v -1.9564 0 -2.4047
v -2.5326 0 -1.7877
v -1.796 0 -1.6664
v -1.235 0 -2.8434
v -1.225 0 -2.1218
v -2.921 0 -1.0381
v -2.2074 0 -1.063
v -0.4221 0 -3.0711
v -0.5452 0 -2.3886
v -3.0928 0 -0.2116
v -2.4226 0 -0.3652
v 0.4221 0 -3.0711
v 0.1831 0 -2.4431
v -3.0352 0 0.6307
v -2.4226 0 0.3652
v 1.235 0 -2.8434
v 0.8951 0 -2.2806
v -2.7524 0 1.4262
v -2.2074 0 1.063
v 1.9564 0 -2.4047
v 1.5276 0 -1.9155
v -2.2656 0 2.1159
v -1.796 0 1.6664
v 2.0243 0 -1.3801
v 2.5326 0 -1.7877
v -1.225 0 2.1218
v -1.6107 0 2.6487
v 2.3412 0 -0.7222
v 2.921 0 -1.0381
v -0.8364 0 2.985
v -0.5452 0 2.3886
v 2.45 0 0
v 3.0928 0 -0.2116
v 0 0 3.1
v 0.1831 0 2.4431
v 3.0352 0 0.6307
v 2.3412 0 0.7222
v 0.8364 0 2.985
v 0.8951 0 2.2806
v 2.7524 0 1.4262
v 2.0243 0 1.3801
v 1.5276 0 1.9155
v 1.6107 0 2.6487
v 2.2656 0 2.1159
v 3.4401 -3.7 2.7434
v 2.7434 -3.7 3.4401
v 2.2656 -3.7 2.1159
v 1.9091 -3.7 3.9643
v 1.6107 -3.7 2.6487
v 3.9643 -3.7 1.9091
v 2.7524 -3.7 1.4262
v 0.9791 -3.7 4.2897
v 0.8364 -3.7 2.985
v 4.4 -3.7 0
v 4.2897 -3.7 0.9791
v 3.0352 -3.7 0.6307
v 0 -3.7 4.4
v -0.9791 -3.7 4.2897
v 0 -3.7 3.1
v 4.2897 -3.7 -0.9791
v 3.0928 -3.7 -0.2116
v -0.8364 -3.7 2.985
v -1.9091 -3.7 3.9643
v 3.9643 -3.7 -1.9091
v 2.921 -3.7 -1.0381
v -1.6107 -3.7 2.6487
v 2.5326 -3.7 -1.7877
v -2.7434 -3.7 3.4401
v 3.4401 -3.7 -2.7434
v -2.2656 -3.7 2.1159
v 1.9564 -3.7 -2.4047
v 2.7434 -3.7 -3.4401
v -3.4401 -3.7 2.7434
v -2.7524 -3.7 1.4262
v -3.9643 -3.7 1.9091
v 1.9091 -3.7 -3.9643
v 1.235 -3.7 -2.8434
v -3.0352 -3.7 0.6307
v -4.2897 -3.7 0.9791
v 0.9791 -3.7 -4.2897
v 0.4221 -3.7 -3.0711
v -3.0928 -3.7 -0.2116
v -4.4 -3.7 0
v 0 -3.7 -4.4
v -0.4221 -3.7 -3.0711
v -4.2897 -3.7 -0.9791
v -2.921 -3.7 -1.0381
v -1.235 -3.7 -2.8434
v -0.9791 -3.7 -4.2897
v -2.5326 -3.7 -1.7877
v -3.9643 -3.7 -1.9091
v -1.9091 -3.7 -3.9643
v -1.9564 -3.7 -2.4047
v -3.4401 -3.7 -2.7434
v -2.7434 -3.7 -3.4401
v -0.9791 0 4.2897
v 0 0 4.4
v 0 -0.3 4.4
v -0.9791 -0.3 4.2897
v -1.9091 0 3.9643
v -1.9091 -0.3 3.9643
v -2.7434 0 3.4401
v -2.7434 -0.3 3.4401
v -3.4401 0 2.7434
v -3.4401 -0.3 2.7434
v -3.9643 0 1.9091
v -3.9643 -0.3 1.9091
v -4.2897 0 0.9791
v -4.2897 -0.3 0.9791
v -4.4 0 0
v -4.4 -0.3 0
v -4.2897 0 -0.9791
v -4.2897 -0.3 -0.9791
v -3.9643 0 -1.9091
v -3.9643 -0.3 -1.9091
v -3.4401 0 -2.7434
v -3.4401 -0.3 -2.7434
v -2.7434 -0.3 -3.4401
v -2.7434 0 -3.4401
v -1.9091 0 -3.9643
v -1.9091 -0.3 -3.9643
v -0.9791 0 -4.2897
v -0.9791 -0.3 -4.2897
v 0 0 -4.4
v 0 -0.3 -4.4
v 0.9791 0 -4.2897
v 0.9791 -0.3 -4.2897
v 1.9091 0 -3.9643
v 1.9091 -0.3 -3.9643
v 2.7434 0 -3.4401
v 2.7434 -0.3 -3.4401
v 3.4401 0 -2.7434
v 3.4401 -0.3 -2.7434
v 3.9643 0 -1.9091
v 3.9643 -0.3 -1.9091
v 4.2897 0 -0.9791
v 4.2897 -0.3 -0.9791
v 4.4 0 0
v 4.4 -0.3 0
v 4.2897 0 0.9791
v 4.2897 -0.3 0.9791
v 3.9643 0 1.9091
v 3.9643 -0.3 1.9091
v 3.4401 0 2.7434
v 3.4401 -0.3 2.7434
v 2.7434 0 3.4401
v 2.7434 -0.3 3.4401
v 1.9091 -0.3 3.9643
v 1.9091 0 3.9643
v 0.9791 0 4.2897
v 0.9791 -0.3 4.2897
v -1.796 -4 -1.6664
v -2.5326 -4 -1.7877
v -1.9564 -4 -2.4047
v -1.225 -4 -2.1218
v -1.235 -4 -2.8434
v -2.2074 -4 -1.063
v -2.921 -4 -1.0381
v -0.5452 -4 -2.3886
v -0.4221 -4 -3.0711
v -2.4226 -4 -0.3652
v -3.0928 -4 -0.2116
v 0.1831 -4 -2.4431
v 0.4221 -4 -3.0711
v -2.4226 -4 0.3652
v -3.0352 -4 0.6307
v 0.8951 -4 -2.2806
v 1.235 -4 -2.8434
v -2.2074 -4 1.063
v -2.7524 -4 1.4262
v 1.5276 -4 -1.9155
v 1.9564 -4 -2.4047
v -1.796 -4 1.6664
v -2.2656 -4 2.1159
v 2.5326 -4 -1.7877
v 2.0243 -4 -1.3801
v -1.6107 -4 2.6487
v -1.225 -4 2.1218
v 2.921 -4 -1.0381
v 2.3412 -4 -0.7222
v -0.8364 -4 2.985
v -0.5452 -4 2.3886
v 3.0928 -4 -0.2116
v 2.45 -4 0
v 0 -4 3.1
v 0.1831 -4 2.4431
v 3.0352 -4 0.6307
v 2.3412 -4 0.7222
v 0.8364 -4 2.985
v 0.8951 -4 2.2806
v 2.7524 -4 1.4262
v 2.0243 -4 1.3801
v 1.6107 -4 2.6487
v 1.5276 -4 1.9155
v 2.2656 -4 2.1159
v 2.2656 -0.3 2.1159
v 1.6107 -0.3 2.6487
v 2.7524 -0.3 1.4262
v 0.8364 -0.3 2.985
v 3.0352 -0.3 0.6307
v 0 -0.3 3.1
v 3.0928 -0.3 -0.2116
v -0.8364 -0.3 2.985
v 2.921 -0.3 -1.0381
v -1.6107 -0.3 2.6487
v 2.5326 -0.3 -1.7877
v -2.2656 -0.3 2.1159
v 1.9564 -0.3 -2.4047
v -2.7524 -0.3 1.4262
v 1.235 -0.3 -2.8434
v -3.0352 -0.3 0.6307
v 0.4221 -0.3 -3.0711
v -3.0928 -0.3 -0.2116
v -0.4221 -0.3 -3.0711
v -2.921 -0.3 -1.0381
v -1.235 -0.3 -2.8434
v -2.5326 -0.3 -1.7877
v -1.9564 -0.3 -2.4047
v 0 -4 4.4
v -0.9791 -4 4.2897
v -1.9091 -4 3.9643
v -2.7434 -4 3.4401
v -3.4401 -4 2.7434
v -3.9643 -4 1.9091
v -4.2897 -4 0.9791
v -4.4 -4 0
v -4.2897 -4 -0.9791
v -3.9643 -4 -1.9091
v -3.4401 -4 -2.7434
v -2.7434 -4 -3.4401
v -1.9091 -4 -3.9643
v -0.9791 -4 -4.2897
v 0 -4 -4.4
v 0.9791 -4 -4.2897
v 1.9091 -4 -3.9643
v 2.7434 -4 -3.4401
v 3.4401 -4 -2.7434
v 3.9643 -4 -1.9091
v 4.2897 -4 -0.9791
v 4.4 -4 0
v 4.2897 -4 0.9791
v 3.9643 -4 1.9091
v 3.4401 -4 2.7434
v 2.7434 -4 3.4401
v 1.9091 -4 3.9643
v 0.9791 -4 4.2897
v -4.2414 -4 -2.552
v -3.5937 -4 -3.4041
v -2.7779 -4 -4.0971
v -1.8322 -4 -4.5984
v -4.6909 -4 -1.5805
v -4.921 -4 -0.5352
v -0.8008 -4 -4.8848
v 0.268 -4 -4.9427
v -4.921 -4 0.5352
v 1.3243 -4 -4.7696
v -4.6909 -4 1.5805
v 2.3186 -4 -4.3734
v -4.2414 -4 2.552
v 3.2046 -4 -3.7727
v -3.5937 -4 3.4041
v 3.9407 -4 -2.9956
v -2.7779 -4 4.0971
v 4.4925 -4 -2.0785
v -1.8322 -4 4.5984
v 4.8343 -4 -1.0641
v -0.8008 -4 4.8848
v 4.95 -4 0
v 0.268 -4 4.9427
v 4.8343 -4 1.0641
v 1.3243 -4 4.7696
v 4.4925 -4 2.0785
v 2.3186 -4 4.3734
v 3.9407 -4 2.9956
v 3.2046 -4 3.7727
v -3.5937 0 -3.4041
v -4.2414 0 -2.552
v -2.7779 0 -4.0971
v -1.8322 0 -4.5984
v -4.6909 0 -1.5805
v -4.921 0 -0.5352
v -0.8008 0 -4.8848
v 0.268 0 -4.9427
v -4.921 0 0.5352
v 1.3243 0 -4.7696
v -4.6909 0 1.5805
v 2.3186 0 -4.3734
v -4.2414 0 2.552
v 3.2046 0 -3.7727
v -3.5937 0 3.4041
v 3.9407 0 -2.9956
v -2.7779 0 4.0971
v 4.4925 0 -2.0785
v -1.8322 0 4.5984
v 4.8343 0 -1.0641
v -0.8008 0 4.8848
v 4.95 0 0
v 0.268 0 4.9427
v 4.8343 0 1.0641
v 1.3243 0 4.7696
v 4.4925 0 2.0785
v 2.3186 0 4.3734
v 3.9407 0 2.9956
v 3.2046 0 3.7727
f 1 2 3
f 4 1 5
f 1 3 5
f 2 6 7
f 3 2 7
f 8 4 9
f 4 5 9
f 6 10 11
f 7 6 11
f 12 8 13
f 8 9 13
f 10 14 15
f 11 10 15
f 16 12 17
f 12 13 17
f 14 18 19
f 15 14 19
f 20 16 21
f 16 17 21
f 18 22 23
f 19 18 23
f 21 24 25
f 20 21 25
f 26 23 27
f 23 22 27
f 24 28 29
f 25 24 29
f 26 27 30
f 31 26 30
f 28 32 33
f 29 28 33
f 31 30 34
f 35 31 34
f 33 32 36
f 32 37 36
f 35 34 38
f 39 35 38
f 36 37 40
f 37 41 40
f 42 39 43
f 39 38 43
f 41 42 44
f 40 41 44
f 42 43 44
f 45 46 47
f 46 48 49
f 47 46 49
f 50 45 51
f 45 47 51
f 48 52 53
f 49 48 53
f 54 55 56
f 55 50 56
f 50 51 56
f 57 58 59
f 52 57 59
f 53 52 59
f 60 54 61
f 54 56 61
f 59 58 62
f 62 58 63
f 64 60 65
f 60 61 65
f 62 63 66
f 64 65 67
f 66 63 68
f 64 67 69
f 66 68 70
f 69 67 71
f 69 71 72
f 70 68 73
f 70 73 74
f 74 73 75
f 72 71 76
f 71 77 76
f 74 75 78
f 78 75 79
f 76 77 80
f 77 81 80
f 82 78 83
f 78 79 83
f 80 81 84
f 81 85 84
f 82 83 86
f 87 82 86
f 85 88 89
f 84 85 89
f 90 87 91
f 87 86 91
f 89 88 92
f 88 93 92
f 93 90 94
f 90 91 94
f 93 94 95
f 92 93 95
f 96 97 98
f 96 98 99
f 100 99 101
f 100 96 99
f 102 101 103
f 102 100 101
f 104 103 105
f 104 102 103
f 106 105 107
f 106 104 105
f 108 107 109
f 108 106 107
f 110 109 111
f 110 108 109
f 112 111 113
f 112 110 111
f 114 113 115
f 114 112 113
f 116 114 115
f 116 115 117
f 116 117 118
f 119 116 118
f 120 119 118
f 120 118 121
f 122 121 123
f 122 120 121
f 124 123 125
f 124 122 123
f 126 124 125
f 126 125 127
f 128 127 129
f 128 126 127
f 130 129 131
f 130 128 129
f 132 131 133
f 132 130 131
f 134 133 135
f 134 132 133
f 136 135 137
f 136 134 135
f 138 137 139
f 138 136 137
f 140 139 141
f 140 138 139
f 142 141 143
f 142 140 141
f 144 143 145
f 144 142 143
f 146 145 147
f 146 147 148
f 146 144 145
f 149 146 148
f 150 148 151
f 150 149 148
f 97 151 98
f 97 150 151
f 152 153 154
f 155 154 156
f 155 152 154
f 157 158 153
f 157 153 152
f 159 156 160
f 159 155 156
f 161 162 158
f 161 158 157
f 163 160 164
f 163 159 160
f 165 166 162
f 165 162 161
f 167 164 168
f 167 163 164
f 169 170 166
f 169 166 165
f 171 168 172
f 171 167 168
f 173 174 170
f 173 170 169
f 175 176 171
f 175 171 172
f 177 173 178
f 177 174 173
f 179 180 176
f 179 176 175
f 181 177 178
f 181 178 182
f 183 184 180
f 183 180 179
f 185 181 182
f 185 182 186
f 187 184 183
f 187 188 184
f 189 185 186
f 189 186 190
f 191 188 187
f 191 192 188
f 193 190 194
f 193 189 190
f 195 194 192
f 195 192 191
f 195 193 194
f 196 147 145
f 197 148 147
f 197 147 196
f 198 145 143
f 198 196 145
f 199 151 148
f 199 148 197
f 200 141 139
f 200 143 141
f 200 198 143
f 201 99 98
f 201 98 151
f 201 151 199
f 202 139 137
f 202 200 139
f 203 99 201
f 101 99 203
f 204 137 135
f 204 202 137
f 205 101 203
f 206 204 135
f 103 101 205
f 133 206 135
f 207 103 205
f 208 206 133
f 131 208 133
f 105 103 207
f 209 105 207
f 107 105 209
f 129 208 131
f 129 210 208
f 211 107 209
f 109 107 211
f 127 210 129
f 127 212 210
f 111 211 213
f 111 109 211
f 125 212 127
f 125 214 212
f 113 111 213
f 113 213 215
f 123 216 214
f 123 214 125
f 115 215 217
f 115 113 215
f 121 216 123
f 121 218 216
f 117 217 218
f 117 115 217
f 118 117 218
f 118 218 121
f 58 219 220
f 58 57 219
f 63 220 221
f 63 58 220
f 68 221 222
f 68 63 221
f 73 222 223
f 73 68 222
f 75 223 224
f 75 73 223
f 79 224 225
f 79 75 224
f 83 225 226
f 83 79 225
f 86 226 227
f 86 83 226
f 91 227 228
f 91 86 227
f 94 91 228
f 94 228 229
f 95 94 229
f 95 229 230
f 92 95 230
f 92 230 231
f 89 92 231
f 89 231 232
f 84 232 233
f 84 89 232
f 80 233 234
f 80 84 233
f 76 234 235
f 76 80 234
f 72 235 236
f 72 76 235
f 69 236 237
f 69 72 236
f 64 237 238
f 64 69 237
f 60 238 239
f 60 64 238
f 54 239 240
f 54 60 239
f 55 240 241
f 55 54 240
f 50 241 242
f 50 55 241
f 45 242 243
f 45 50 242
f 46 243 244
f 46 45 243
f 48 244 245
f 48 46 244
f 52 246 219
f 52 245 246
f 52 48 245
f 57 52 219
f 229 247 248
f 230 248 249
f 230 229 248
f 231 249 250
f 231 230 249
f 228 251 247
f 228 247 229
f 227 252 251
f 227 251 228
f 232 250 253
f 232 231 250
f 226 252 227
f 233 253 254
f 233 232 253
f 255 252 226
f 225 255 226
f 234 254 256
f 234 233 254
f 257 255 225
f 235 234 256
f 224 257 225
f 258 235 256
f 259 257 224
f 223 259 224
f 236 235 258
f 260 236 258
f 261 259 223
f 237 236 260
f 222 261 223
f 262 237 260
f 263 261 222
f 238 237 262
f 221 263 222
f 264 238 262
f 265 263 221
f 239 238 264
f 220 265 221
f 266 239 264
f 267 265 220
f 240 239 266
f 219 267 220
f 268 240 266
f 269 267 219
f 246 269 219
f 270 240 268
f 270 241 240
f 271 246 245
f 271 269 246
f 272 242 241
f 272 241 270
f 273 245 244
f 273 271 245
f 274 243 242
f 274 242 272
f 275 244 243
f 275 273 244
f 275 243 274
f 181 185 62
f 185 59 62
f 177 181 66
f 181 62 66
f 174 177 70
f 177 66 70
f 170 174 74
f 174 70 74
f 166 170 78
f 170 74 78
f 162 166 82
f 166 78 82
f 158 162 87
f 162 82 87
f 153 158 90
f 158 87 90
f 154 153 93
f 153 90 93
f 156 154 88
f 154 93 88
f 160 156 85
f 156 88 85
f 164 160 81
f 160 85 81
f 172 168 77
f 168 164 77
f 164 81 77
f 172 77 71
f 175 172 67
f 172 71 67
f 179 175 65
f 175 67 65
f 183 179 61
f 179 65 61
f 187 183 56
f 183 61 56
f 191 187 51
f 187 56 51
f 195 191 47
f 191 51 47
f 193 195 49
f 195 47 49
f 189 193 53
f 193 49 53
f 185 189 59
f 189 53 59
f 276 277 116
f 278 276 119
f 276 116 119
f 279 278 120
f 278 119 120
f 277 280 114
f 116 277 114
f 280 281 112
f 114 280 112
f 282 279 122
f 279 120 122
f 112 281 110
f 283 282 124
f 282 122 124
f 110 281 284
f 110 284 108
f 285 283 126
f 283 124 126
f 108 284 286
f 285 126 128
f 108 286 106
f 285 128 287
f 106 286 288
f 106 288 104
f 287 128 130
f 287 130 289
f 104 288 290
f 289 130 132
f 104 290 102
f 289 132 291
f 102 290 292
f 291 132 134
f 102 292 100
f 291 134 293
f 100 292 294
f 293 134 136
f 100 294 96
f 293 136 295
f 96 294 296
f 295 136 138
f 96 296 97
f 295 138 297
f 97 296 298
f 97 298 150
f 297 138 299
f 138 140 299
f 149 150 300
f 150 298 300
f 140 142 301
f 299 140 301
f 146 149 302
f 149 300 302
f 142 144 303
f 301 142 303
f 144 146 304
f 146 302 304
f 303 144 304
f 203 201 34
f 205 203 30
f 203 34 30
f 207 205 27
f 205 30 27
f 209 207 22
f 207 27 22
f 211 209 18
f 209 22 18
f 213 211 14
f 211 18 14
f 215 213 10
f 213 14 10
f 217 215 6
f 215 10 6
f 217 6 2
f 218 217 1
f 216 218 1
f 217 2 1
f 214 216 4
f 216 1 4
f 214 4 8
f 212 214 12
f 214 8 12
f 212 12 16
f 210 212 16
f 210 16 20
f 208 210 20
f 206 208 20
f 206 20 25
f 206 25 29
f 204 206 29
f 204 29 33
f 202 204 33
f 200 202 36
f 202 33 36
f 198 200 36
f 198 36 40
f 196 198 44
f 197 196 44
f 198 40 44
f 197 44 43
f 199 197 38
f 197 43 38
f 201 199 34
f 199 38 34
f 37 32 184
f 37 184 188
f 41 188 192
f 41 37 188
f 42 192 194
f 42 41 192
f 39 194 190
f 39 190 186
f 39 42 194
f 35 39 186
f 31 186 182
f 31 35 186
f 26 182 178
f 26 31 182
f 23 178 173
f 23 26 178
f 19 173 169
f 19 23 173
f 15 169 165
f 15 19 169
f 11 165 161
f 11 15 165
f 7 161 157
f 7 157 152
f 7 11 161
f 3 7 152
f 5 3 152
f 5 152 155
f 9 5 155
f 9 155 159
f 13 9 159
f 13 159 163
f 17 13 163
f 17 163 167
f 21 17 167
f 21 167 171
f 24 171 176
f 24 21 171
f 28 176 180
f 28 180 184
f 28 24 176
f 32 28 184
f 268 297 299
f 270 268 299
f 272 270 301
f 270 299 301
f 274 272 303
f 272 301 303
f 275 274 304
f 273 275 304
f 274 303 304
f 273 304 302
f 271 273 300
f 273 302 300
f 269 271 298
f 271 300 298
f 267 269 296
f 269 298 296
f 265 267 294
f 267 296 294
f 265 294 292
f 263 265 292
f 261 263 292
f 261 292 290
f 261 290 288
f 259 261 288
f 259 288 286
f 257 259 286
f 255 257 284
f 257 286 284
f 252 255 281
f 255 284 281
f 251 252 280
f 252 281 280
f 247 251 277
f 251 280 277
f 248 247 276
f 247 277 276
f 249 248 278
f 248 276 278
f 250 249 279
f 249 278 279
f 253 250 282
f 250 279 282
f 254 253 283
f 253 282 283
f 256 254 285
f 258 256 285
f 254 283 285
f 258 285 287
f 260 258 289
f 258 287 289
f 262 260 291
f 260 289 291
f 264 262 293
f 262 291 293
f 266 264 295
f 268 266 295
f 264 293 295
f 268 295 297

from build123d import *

# Parameters (mm, degrees)
F0_R     = 4.95
F0_R_2   = 2.45
F1_DEPTH = 4
F2_W     = 0.722248
F2_H     = 1.3
F2_W_2   = 0.566372


with BuildPart() as f1:
    # F0 (on Front) → F1 (new body)
    with BuildSketch(Plane.XZ):
        Circle(F0_R)
        Circle(F0_R_2, mode=Mode.SUBTRACT)
    extrude(amount=F1_DEPTH)

    # F2 (on Right) → F3 (revolve, cut)
    with BuildSketch(Plane.YZ):
        with Locations((-4.061124, 3.75)):
            Rectangle(F2_W, F2_H)
        with Locations((-0.016814, 3.75)):
            Rectangle(F2_W_2, F2_H)
    revolve(axis=Axis((0, -1, 0), (0, -1, 0)), mode=Mode.SUBTRACT)


solid = f1.part
